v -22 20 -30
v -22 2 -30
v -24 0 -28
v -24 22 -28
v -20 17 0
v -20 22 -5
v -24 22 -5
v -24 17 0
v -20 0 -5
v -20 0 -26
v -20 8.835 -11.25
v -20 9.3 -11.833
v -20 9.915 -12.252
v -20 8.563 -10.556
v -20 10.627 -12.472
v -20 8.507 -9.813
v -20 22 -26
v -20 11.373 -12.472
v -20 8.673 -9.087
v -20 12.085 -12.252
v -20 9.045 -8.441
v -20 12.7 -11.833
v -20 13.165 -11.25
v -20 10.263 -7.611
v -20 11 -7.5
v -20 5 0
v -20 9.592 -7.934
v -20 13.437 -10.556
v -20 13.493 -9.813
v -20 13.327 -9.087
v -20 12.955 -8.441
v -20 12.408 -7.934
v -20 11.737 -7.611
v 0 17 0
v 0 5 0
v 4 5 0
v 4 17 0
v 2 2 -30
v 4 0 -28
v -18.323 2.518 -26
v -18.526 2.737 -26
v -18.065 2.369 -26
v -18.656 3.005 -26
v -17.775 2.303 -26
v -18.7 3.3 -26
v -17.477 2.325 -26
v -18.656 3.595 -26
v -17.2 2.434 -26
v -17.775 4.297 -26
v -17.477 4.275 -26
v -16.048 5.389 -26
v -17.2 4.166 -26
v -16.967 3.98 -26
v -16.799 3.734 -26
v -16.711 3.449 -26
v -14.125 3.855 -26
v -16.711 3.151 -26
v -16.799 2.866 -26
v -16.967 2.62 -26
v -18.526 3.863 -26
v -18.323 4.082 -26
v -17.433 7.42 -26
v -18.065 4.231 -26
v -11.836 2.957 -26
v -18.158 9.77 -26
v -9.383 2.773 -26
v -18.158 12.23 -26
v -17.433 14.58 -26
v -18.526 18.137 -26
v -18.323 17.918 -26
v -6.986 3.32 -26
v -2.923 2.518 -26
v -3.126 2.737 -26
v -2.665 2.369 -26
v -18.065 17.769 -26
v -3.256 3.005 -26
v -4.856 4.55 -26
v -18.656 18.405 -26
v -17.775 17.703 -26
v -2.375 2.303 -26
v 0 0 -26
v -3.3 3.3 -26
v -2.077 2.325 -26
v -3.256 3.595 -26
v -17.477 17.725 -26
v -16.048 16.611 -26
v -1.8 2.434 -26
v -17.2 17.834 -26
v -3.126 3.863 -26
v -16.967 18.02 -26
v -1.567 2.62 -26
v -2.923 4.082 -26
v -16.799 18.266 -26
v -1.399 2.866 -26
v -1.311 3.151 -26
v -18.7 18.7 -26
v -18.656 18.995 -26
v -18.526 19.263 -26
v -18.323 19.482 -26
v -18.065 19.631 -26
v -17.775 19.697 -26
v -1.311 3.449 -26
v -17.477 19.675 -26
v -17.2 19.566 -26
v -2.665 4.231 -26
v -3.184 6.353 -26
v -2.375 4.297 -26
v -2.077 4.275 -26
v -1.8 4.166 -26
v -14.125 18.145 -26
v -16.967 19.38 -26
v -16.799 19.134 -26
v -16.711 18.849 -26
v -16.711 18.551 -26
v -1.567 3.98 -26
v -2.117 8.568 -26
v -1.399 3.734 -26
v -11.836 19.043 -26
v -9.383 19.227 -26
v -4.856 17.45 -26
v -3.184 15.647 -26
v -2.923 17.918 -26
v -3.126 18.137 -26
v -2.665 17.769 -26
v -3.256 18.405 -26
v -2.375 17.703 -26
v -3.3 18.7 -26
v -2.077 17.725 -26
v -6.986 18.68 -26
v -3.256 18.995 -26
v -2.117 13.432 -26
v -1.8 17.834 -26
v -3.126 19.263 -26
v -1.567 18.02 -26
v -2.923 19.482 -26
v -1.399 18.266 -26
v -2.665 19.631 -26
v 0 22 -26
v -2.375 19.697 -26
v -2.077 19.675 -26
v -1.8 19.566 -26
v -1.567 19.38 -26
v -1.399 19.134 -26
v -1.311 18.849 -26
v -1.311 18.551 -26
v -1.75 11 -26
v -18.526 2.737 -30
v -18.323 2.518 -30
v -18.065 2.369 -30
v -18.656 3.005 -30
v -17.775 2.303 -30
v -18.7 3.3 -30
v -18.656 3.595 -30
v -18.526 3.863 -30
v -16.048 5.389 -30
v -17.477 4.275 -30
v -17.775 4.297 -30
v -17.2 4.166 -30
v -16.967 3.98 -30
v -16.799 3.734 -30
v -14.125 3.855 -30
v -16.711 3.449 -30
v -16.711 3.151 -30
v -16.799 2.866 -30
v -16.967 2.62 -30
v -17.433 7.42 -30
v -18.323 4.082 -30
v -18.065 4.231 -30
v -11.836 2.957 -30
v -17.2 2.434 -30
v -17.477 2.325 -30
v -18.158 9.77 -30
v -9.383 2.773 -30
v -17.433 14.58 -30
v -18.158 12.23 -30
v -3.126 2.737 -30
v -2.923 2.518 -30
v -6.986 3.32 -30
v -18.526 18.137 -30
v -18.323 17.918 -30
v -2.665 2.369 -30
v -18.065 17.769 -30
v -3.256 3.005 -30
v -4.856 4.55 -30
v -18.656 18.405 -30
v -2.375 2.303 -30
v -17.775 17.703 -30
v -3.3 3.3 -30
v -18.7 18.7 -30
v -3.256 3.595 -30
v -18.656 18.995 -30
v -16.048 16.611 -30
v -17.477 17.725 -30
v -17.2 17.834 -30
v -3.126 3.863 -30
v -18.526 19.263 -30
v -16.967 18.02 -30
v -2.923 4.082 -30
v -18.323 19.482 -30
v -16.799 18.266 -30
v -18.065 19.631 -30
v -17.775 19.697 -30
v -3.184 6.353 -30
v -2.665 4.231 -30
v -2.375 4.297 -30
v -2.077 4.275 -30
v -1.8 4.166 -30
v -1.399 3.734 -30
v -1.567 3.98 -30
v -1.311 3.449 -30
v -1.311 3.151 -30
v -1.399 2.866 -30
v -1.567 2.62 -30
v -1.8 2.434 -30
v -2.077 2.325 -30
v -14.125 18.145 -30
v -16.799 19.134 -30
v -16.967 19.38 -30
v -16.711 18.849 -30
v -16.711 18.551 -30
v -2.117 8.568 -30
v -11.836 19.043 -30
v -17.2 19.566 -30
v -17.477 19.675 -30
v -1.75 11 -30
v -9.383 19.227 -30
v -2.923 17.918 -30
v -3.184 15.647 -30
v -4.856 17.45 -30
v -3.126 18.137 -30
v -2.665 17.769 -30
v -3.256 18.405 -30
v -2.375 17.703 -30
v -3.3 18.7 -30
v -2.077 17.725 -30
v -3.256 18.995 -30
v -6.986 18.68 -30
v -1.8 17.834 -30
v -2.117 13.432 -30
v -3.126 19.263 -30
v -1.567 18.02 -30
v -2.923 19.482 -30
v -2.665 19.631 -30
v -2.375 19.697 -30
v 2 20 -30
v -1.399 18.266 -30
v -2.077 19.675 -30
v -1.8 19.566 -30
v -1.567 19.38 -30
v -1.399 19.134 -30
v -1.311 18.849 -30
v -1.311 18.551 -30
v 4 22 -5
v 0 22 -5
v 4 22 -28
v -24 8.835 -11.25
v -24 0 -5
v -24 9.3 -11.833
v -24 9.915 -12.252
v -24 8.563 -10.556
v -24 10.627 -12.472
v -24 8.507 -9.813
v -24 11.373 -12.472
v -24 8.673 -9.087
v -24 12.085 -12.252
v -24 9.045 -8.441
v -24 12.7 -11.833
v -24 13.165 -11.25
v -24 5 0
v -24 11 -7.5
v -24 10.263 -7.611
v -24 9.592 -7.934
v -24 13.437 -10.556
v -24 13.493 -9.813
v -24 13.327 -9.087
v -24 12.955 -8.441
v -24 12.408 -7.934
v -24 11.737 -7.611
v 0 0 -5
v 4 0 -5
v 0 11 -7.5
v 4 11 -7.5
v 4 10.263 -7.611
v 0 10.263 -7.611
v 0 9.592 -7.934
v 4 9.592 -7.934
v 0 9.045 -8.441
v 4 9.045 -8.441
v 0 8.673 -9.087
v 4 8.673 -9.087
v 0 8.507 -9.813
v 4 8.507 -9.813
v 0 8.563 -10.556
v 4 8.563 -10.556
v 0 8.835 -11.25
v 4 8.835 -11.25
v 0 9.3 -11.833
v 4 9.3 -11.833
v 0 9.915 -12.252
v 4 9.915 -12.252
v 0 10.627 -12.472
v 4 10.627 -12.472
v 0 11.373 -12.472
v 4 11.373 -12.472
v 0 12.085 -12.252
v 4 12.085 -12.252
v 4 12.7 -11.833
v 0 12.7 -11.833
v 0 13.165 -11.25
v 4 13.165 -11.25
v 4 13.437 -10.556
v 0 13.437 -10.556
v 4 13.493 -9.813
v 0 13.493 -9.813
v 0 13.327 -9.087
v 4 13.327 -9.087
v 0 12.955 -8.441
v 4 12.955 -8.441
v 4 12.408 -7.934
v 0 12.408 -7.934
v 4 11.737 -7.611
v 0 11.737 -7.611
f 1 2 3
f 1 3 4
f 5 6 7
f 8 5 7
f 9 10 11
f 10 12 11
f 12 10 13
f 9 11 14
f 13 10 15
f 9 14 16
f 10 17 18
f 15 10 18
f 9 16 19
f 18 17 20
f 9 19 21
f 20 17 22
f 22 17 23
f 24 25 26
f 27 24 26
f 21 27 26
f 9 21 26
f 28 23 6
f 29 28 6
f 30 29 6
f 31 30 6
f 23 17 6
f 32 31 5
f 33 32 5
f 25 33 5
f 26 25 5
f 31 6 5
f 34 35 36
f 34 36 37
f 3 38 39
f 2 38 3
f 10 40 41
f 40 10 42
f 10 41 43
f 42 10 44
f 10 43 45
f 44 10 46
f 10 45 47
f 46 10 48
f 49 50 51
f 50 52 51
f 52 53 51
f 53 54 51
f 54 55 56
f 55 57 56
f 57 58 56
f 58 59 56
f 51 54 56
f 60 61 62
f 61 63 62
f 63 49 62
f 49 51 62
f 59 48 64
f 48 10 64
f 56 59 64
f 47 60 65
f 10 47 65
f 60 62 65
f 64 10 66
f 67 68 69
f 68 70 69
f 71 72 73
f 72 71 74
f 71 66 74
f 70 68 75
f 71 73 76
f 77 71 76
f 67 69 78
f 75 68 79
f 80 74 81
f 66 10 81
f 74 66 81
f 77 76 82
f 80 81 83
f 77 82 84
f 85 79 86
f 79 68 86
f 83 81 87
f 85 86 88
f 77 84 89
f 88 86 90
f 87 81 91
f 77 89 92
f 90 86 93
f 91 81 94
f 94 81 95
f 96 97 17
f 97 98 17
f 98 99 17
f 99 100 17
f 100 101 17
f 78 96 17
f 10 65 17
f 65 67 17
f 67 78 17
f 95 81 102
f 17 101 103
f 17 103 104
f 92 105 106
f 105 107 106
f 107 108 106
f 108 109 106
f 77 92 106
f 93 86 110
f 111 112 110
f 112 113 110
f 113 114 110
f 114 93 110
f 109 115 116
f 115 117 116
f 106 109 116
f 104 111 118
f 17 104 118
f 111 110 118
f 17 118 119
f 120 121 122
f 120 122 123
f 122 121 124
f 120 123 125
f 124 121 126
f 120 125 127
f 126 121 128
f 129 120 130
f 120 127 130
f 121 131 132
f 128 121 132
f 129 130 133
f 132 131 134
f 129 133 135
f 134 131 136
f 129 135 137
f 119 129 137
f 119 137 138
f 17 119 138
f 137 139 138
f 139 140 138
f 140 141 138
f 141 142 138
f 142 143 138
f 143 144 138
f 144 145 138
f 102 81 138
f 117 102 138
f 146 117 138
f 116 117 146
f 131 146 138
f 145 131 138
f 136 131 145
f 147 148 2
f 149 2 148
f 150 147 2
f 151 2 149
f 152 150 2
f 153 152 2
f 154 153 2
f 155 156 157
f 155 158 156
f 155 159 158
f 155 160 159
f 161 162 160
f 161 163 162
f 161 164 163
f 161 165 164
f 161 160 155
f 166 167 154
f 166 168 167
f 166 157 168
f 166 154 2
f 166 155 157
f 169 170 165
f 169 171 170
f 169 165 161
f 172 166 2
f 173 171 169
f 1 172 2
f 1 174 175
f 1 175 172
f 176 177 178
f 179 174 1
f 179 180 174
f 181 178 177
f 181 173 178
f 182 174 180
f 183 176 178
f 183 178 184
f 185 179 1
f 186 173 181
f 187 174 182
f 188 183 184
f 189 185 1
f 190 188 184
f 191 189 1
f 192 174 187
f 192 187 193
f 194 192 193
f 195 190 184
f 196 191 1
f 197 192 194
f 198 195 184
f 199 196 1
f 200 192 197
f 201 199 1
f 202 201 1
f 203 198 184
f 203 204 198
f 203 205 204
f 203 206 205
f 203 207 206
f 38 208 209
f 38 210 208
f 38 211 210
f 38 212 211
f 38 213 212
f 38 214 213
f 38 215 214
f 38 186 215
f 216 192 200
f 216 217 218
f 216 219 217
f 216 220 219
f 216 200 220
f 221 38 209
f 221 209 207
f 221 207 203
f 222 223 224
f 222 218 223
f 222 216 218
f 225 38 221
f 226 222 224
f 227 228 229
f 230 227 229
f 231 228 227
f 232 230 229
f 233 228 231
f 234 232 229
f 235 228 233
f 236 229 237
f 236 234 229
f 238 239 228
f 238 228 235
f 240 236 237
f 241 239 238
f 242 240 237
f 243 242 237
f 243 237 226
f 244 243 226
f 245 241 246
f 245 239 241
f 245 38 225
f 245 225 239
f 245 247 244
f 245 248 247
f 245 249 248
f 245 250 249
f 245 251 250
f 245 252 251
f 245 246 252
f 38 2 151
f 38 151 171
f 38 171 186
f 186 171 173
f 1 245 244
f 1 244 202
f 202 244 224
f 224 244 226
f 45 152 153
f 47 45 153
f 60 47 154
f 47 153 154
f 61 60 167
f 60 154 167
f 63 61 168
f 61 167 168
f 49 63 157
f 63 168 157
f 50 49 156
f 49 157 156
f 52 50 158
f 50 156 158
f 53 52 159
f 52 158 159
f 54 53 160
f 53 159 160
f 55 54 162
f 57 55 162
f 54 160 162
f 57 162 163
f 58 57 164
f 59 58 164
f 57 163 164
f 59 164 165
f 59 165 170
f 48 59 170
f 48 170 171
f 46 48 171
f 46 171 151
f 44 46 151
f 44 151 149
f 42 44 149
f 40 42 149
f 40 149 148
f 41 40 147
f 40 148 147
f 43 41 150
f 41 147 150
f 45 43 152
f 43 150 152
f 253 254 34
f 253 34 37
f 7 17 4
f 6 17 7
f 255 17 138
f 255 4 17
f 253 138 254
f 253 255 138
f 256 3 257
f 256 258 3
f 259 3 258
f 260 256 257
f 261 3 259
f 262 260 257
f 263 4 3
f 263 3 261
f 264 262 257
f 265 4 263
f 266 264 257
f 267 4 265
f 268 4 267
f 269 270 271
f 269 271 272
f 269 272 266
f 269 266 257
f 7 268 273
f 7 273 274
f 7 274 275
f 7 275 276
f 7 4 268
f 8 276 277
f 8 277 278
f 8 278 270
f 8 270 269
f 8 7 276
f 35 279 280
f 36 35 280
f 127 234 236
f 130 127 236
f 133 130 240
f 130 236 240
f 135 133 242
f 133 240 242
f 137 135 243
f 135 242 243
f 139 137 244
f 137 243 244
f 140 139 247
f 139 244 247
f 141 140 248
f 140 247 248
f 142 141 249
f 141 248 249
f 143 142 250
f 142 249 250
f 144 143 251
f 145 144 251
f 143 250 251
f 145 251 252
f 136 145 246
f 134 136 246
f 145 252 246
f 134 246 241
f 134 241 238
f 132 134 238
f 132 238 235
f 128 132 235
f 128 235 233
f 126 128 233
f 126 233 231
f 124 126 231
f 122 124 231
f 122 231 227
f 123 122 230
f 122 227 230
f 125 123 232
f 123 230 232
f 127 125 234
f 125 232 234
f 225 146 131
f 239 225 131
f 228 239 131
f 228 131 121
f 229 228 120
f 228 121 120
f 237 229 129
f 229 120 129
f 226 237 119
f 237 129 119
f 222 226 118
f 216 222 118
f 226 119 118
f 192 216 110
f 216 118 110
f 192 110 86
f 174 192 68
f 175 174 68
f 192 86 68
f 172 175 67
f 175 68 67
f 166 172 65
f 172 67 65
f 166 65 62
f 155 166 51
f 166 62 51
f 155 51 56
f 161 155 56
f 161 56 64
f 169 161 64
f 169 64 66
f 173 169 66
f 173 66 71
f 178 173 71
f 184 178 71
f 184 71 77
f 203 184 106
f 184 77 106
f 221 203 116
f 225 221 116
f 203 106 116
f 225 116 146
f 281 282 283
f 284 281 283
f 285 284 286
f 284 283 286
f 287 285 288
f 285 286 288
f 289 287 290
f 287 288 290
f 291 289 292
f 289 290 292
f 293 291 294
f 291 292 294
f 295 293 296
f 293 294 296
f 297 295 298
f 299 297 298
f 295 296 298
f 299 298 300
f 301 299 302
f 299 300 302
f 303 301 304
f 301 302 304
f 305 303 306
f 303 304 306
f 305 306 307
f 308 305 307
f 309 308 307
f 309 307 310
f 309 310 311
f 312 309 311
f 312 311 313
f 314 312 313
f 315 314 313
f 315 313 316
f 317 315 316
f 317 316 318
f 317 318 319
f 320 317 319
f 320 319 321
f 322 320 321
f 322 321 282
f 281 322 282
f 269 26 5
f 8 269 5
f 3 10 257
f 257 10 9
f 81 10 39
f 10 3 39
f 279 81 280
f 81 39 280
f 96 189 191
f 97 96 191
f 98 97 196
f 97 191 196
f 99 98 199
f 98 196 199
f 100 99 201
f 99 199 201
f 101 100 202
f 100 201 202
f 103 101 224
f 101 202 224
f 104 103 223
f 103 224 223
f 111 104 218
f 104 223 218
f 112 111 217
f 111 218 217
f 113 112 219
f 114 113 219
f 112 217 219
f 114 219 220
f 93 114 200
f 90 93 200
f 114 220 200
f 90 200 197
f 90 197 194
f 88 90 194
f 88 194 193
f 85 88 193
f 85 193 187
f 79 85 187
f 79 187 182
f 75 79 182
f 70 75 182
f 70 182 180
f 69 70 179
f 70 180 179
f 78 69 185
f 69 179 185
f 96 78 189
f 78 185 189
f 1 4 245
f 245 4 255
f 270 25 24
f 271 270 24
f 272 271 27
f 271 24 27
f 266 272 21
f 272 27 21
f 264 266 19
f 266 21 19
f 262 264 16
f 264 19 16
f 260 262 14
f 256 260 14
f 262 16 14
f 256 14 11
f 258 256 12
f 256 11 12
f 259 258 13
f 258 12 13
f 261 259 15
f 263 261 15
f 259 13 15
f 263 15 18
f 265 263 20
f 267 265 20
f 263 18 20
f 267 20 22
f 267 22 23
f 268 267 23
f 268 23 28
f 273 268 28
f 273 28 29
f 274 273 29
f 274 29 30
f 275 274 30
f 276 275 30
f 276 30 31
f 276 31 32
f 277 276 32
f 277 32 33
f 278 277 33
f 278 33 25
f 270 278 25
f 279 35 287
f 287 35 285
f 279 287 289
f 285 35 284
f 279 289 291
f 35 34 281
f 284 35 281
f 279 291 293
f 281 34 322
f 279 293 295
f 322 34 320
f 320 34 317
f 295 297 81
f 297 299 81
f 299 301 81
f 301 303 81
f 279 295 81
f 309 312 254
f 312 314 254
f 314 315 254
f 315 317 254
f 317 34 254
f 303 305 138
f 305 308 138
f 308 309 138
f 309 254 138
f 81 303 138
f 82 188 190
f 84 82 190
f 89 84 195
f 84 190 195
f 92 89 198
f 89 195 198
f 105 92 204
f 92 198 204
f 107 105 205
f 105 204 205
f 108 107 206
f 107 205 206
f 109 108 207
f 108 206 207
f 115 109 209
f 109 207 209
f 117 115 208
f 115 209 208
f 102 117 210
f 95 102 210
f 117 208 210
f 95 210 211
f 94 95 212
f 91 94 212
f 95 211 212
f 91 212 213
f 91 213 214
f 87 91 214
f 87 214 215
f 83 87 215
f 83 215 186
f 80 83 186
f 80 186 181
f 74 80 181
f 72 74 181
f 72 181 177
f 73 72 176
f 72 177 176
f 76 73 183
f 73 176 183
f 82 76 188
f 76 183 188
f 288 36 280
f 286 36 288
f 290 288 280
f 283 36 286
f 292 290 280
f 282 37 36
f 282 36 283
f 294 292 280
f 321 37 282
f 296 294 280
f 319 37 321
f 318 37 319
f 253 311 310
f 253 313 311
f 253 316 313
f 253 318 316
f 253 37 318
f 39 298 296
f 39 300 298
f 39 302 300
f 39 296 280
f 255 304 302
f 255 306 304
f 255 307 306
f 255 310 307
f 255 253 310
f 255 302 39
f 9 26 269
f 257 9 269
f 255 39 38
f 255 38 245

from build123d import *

# Parameters (mm, degrees)
SKETCH1_W           = 30
SKETCH1_H           = 22
BOSS_EXTRUDE1_DEPTH = 4
SKETCH2_W           = 4
SKETCH2_H           = 22
BOSS_EXTRUDE2_DEPTH = 20
SKETCH3_W           = 30
SKETCH3_H           = 22
BOSS_EXTRUDE3_DEPTH = 4
CHAMFER2_SIZE       = 5
SKETCH8_R           = 8.25
CUT_EXTRUDE1_DEPTH  = 4
SKETCH9_R           = 1
CUT_EXTRUDE2_DEPTH  = 4
CHAMFER3_SIZE       = 2
CUT_EXTRUDE3_REACH  = 48.562
SKETCH4_R           = 2.5


with BuildPart() as part:
    # Sketch1 → Boss-Extrude1 (new body)
    with BuildSketch(Plane(origin=(0, 0, 0), x_dir=(0, 0, -1), z_dir=(1, 0, 0))):
        with Locations((15, 11)):
            Rectangle(SKETCH1_W, SKETCH1_H)
    extrude(amount=BOSS_EXTRUDE1_DEPTH)

    # Sketch2 → Boss-Extrude2 (add)
    with BuildSketch(Plane.ZY):
        with Locations((-28, 11)):
            Rectangle(SKETCH2_W, SKETCH2_H)
    extrude(amount=BOSS_EXTRUDE2_DEPTH)

    # Sketch3 → Boss-Extrude3 (add)
    with BuildSketch(Plane.ZY.offset(20)):
        with Locations((-15, 11)):
            Rectangle(SKETCH3_W, SKETCH3_H)
    extrude(amount=BOSS_EXTRUDE3_DEPTH)

    # Chamfer2
    chamfer2_edges = [part.edges().sort_by_distance(p)[0] for p in [
        (-22, 22, 0),
        (-22, 0, 0),
        (2, 22, 0),
        (2, 0, 0),
    ]]
    chamfer(chamfer2_edges, length=CHAMFER2_SIZE)

    # Sketch8 → Cut-Extrude1 (cut)
    with BuildSketch(Plane.XY.offset(-26)):
        with Locations((-10, 11)):
            Circle(SKETCH8_R)
    extrude(amount=-CUT_EXTRUDE1_DEPTH, mode=Mode.SUBTRACT)

    # Sketch9 → Cut-Extrude2 (cut)
    with BuildSketch(Plane(origin=(0, 0, -30), x_dir=(-1, 0, 0), z_dir=(0, 0, -1))):
        with Locations((2.3, 18.7)):
            Circle(SKETCH9_R)
        with Locations((17.7, 18.7)):
            Circle(SKETCH9_R)
        with Locations((17.7, 3.3)):
            Circle(SKETCH9_R)
        with Locations((2.3, 3.3)):
            Circle(SKETCH9_R)
    extrude(amount=-CUT_EXTRUDE2_DEPTH, mode=Mode.SUBTRACT)

    # Chamfer3
    chamfer3_edges = [part.edges().sort_by_distance(p)[0] for p in [
        (4, 11, -30),
        (-24, 11, -30),
        (-10, 22, -30),
        (-10, 0, -30),
    ]]
    chamfer(chamfer3_edges, length=CHAMFER3_SIZE)

    # Cut-Extrude3: up to this face of the body (flat: up to its plane)
    cut_extrude3_end = Plane(part.part.faces().sort_by_distance((-24, 11, -14.521714608))[0])
    # Sketch4 → Cut-Extrude3 (cut, up to the picked face)
    with BuildSketch(Plane(origin=(4, 0, 0), x_dir=(0, 0, -1), z_dir=(1, 0, 0)), mode=Mode.PRIVATE) as cut_extrude3_sk1:
        with Locations(Location((10, 11, 0), (0, 0, 180))):
            Circle(SKETCH4_R)
    cut_extrude3_tool1 = split(extrude(cut_extrude3_sk1.sketch, amount=-CUT_EXTRUDE3_REACH, mode=Mode.PRIVATE), bisect_by=cut_extrude3_end, keep=Keep.BOTH, mode=Mode.PRIVATE)
    add(cut_extrude3_tool1.solids().sort_by(Axis((4, 11, -10), (-1, 0, 0)))[0], mode=Mode.SUBTRACT)


solid = part.part
